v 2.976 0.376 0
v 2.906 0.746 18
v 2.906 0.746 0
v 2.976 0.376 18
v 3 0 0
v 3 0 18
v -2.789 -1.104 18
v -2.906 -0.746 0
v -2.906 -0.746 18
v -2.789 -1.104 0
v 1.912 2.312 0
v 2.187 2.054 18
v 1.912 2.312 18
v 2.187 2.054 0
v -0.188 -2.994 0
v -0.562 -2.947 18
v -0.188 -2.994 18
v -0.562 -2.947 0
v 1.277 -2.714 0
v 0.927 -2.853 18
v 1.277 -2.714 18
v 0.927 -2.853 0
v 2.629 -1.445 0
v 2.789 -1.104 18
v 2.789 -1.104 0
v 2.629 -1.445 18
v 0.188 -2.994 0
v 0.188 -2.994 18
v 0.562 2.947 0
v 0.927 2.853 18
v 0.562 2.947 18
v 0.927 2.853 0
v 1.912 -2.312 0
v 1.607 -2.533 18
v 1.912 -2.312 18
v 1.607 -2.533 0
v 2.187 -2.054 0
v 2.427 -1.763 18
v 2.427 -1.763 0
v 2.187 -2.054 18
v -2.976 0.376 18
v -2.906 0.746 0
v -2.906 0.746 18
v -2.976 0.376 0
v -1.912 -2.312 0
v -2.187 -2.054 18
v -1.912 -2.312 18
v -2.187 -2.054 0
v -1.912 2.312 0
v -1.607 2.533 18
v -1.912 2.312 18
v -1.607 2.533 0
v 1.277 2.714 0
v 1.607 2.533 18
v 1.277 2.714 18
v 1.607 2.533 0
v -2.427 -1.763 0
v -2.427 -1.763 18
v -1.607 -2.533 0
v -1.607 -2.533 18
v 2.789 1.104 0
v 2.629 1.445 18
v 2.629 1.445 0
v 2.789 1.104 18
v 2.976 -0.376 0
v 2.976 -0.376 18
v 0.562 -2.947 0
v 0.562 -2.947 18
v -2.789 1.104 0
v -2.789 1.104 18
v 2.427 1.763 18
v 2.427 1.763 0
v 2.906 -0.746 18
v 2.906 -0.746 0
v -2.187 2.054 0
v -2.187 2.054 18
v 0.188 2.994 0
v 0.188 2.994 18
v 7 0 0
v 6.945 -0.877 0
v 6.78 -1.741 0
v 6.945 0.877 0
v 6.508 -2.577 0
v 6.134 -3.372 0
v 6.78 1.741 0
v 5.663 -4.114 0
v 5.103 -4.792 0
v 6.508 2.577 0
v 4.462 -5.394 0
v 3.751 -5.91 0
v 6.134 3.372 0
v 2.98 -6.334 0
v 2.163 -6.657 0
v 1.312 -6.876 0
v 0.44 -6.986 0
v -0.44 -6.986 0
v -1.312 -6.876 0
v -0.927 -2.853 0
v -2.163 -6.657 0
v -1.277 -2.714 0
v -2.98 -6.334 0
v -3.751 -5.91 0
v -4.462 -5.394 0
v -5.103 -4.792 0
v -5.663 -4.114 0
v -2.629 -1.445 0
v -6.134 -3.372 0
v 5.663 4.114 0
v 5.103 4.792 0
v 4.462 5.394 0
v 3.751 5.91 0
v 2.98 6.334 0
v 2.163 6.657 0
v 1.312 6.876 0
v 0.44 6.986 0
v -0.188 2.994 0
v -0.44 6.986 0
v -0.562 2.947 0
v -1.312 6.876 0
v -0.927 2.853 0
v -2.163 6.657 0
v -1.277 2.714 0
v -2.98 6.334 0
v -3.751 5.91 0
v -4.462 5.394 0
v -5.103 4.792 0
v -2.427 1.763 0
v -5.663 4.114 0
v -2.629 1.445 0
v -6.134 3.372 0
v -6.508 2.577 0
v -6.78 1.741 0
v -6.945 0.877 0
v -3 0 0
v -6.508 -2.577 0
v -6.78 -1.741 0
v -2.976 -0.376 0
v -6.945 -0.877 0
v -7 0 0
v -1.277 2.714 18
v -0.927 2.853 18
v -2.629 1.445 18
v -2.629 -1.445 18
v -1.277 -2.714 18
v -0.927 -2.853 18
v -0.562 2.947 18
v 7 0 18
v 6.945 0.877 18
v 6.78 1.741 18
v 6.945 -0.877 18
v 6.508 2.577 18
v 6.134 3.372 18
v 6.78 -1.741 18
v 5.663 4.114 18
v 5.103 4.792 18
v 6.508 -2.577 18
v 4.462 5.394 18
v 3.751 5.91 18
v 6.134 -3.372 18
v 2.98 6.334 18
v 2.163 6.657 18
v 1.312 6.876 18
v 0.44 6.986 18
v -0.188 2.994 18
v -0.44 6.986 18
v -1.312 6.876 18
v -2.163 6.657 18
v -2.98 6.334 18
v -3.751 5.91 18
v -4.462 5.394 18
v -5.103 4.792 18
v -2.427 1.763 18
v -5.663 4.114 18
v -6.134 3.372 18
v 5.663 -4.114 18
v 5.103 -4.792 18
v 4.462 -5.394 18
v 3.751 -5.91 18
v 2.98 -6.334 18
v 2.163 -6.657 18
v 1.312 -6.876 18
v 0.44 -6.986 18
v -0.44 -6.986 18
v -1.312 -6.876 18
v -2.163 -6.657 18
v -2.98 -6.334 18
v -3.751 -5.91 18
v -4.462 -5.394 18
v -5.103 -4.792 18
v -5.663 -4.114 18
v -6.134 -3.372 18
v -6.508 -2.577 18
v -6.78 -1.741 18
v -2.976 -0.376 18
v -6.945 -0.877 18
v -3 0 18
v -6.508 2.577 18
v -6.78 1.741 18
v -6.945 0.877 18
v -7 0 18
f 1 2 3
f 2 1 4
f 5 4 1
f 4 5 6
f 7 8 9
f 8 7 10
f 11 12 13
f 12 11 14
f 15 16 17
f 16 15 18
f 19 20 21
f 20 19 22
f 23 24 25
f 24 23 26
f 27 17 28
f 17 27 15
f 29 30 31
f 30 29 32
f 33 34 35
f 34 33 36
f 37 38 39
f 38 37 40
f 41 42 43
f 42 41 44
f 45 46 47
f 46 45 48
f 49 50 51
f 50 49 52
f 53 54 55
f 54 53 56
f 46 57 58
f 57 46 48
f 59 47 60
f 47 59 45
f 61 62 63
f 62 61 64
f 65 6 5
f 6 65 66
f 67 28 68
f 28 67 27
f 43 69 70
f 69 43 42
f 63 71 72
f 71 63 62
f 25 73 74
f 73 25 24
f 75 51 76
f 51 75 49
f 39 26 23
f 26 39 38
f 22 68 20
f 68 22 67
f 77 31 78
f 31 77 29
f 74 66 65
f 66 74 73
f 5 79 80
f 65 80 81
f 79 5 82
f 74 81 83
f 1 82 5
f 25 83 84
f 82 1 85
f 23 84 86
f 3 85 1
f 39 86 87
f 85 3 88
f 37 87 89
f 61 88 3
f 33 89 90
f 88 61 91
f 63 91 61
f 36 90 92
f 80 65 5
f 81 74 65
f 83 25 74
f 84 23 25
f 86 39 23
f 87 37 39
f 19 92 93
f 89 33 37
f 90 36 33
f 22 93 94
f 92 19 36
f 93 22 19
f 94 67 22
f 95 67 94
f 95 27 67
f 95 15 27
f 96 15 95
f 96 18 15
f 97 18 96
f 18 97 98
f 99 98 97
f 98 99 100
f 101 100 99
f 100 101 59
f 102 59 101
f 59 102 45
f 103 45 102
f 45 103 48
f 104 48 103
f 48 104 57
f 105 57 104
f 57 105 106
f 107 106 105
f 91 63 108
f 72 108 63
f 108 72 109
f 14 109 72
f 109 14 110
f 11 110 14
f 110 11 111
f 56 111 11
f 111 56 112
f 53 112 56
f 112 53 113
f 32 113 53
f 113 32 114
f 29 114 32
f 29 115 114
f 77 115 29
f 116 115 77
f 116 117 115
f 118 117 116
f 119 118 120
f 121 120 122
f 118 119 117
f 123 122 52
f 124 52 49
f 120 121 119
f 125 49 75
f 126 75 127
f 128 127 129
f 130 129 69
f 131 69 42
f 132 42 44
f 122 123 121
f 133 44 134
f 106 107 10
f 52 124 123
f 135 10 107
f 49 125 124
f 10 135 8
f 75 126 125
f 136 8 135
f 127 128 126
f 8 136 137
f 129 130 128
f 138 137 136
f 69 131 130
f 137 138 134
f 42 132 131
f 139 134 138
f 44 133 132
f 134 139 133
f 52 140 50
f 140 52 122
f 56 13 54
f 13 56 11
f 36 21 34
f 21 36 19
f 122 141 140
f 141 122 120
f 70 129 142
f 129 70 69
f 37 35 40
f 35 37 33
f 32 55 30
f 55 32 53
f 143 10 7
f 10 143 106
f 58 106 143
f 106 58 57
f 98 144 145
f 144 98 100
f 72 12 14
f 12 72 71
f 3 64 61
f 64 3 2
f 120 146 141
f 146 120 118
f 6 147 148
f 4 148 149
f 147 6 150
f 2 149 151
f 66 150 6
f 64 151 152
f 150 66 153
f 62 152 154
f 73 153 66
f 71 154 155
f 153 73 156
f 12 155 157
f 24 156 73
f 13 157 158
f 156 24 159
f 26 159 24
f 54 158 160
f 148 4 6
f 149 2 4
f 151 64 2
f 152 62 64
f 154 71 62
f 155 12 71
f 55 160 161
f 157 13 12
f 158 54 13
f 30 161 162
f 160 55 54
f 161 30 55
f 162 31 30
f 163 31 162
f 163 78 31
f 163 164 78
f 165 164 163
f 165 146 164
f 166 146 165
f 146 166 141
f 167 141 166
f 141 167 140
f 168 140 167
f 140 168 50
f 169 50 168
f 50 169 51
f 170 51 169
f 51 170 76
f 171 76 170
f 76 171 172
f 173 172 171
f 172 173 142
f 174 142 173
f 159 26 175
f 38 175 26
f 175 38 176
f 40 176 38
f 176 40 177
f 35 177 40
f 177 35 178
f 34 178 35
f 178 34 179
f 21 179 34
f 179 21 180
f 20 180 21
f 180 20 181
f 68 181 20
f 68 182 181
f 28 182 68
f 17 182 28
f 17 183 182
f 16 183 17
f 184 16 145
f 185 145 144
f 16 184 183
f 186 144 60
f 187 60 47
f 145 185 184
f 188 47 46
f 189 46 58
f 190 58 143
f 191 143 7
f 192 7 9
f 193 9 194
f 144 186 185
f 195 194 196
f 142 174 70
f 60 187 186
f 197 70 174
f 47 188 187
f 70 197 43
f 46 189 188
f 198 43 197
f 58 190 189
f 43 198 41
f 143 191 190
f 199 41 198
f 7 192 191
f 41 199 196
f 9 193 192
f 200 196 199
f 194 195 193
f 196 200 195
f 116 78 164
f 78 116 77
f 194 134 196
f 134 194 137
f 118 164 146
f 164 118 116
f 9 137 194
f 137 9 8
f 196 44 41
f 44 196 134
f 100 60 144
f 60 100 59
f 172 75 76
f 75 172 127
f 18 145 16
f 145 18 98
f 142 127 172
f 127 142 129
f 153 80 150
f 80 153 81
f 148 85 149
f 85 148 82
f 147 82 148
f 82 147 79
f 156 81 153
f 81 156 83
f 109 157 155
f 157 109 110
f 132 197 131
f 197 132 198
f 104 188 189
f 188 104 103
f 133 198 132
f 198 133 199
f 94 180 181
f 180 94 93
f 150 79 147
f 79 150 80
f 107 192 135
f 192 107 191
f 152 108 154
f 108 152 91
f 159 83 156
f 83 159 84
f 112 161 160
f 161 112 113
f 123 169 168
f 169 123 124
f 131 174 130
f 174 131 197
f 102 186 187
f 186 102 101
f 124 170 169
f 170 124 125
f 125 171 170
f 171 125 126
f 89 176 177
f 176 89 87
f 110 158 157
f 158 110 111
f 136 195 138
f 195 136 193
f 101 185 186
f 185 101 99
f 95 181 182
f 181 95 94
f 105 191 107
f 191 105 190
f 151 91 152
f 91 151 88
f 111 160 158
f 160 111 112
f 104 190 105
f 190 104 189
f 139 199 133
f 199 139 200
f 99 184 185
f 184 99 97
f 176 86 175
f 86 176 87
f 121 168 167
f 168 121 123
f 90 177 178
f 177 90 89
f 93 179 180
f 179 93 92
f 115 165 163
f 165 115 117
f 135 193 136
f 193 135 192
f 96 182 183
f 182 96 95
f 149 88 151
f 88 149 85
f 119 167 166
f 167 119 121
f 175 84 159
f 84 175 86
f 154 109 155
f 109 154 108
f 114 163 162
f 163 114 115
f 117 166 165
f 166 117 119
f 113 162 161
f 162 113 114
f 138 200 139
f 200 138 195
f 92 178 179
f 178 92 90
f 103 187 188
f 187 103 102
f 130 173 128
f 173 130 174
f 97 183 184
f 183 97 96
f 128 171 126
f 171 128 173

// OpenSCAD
$fn = 50;


difference() {
	union() {
		cylinder(h = 18, r = 7.0000000000);
	}
	union() {
		cylinder(h = 18, r = 3.0000000000);
		cylinder(h = 18, r = 1.5000000000);
		cylinder(h = 18, r = 1.5000000000);
		cylinder(h = 18, r = 1.5000000000);
	}
}
